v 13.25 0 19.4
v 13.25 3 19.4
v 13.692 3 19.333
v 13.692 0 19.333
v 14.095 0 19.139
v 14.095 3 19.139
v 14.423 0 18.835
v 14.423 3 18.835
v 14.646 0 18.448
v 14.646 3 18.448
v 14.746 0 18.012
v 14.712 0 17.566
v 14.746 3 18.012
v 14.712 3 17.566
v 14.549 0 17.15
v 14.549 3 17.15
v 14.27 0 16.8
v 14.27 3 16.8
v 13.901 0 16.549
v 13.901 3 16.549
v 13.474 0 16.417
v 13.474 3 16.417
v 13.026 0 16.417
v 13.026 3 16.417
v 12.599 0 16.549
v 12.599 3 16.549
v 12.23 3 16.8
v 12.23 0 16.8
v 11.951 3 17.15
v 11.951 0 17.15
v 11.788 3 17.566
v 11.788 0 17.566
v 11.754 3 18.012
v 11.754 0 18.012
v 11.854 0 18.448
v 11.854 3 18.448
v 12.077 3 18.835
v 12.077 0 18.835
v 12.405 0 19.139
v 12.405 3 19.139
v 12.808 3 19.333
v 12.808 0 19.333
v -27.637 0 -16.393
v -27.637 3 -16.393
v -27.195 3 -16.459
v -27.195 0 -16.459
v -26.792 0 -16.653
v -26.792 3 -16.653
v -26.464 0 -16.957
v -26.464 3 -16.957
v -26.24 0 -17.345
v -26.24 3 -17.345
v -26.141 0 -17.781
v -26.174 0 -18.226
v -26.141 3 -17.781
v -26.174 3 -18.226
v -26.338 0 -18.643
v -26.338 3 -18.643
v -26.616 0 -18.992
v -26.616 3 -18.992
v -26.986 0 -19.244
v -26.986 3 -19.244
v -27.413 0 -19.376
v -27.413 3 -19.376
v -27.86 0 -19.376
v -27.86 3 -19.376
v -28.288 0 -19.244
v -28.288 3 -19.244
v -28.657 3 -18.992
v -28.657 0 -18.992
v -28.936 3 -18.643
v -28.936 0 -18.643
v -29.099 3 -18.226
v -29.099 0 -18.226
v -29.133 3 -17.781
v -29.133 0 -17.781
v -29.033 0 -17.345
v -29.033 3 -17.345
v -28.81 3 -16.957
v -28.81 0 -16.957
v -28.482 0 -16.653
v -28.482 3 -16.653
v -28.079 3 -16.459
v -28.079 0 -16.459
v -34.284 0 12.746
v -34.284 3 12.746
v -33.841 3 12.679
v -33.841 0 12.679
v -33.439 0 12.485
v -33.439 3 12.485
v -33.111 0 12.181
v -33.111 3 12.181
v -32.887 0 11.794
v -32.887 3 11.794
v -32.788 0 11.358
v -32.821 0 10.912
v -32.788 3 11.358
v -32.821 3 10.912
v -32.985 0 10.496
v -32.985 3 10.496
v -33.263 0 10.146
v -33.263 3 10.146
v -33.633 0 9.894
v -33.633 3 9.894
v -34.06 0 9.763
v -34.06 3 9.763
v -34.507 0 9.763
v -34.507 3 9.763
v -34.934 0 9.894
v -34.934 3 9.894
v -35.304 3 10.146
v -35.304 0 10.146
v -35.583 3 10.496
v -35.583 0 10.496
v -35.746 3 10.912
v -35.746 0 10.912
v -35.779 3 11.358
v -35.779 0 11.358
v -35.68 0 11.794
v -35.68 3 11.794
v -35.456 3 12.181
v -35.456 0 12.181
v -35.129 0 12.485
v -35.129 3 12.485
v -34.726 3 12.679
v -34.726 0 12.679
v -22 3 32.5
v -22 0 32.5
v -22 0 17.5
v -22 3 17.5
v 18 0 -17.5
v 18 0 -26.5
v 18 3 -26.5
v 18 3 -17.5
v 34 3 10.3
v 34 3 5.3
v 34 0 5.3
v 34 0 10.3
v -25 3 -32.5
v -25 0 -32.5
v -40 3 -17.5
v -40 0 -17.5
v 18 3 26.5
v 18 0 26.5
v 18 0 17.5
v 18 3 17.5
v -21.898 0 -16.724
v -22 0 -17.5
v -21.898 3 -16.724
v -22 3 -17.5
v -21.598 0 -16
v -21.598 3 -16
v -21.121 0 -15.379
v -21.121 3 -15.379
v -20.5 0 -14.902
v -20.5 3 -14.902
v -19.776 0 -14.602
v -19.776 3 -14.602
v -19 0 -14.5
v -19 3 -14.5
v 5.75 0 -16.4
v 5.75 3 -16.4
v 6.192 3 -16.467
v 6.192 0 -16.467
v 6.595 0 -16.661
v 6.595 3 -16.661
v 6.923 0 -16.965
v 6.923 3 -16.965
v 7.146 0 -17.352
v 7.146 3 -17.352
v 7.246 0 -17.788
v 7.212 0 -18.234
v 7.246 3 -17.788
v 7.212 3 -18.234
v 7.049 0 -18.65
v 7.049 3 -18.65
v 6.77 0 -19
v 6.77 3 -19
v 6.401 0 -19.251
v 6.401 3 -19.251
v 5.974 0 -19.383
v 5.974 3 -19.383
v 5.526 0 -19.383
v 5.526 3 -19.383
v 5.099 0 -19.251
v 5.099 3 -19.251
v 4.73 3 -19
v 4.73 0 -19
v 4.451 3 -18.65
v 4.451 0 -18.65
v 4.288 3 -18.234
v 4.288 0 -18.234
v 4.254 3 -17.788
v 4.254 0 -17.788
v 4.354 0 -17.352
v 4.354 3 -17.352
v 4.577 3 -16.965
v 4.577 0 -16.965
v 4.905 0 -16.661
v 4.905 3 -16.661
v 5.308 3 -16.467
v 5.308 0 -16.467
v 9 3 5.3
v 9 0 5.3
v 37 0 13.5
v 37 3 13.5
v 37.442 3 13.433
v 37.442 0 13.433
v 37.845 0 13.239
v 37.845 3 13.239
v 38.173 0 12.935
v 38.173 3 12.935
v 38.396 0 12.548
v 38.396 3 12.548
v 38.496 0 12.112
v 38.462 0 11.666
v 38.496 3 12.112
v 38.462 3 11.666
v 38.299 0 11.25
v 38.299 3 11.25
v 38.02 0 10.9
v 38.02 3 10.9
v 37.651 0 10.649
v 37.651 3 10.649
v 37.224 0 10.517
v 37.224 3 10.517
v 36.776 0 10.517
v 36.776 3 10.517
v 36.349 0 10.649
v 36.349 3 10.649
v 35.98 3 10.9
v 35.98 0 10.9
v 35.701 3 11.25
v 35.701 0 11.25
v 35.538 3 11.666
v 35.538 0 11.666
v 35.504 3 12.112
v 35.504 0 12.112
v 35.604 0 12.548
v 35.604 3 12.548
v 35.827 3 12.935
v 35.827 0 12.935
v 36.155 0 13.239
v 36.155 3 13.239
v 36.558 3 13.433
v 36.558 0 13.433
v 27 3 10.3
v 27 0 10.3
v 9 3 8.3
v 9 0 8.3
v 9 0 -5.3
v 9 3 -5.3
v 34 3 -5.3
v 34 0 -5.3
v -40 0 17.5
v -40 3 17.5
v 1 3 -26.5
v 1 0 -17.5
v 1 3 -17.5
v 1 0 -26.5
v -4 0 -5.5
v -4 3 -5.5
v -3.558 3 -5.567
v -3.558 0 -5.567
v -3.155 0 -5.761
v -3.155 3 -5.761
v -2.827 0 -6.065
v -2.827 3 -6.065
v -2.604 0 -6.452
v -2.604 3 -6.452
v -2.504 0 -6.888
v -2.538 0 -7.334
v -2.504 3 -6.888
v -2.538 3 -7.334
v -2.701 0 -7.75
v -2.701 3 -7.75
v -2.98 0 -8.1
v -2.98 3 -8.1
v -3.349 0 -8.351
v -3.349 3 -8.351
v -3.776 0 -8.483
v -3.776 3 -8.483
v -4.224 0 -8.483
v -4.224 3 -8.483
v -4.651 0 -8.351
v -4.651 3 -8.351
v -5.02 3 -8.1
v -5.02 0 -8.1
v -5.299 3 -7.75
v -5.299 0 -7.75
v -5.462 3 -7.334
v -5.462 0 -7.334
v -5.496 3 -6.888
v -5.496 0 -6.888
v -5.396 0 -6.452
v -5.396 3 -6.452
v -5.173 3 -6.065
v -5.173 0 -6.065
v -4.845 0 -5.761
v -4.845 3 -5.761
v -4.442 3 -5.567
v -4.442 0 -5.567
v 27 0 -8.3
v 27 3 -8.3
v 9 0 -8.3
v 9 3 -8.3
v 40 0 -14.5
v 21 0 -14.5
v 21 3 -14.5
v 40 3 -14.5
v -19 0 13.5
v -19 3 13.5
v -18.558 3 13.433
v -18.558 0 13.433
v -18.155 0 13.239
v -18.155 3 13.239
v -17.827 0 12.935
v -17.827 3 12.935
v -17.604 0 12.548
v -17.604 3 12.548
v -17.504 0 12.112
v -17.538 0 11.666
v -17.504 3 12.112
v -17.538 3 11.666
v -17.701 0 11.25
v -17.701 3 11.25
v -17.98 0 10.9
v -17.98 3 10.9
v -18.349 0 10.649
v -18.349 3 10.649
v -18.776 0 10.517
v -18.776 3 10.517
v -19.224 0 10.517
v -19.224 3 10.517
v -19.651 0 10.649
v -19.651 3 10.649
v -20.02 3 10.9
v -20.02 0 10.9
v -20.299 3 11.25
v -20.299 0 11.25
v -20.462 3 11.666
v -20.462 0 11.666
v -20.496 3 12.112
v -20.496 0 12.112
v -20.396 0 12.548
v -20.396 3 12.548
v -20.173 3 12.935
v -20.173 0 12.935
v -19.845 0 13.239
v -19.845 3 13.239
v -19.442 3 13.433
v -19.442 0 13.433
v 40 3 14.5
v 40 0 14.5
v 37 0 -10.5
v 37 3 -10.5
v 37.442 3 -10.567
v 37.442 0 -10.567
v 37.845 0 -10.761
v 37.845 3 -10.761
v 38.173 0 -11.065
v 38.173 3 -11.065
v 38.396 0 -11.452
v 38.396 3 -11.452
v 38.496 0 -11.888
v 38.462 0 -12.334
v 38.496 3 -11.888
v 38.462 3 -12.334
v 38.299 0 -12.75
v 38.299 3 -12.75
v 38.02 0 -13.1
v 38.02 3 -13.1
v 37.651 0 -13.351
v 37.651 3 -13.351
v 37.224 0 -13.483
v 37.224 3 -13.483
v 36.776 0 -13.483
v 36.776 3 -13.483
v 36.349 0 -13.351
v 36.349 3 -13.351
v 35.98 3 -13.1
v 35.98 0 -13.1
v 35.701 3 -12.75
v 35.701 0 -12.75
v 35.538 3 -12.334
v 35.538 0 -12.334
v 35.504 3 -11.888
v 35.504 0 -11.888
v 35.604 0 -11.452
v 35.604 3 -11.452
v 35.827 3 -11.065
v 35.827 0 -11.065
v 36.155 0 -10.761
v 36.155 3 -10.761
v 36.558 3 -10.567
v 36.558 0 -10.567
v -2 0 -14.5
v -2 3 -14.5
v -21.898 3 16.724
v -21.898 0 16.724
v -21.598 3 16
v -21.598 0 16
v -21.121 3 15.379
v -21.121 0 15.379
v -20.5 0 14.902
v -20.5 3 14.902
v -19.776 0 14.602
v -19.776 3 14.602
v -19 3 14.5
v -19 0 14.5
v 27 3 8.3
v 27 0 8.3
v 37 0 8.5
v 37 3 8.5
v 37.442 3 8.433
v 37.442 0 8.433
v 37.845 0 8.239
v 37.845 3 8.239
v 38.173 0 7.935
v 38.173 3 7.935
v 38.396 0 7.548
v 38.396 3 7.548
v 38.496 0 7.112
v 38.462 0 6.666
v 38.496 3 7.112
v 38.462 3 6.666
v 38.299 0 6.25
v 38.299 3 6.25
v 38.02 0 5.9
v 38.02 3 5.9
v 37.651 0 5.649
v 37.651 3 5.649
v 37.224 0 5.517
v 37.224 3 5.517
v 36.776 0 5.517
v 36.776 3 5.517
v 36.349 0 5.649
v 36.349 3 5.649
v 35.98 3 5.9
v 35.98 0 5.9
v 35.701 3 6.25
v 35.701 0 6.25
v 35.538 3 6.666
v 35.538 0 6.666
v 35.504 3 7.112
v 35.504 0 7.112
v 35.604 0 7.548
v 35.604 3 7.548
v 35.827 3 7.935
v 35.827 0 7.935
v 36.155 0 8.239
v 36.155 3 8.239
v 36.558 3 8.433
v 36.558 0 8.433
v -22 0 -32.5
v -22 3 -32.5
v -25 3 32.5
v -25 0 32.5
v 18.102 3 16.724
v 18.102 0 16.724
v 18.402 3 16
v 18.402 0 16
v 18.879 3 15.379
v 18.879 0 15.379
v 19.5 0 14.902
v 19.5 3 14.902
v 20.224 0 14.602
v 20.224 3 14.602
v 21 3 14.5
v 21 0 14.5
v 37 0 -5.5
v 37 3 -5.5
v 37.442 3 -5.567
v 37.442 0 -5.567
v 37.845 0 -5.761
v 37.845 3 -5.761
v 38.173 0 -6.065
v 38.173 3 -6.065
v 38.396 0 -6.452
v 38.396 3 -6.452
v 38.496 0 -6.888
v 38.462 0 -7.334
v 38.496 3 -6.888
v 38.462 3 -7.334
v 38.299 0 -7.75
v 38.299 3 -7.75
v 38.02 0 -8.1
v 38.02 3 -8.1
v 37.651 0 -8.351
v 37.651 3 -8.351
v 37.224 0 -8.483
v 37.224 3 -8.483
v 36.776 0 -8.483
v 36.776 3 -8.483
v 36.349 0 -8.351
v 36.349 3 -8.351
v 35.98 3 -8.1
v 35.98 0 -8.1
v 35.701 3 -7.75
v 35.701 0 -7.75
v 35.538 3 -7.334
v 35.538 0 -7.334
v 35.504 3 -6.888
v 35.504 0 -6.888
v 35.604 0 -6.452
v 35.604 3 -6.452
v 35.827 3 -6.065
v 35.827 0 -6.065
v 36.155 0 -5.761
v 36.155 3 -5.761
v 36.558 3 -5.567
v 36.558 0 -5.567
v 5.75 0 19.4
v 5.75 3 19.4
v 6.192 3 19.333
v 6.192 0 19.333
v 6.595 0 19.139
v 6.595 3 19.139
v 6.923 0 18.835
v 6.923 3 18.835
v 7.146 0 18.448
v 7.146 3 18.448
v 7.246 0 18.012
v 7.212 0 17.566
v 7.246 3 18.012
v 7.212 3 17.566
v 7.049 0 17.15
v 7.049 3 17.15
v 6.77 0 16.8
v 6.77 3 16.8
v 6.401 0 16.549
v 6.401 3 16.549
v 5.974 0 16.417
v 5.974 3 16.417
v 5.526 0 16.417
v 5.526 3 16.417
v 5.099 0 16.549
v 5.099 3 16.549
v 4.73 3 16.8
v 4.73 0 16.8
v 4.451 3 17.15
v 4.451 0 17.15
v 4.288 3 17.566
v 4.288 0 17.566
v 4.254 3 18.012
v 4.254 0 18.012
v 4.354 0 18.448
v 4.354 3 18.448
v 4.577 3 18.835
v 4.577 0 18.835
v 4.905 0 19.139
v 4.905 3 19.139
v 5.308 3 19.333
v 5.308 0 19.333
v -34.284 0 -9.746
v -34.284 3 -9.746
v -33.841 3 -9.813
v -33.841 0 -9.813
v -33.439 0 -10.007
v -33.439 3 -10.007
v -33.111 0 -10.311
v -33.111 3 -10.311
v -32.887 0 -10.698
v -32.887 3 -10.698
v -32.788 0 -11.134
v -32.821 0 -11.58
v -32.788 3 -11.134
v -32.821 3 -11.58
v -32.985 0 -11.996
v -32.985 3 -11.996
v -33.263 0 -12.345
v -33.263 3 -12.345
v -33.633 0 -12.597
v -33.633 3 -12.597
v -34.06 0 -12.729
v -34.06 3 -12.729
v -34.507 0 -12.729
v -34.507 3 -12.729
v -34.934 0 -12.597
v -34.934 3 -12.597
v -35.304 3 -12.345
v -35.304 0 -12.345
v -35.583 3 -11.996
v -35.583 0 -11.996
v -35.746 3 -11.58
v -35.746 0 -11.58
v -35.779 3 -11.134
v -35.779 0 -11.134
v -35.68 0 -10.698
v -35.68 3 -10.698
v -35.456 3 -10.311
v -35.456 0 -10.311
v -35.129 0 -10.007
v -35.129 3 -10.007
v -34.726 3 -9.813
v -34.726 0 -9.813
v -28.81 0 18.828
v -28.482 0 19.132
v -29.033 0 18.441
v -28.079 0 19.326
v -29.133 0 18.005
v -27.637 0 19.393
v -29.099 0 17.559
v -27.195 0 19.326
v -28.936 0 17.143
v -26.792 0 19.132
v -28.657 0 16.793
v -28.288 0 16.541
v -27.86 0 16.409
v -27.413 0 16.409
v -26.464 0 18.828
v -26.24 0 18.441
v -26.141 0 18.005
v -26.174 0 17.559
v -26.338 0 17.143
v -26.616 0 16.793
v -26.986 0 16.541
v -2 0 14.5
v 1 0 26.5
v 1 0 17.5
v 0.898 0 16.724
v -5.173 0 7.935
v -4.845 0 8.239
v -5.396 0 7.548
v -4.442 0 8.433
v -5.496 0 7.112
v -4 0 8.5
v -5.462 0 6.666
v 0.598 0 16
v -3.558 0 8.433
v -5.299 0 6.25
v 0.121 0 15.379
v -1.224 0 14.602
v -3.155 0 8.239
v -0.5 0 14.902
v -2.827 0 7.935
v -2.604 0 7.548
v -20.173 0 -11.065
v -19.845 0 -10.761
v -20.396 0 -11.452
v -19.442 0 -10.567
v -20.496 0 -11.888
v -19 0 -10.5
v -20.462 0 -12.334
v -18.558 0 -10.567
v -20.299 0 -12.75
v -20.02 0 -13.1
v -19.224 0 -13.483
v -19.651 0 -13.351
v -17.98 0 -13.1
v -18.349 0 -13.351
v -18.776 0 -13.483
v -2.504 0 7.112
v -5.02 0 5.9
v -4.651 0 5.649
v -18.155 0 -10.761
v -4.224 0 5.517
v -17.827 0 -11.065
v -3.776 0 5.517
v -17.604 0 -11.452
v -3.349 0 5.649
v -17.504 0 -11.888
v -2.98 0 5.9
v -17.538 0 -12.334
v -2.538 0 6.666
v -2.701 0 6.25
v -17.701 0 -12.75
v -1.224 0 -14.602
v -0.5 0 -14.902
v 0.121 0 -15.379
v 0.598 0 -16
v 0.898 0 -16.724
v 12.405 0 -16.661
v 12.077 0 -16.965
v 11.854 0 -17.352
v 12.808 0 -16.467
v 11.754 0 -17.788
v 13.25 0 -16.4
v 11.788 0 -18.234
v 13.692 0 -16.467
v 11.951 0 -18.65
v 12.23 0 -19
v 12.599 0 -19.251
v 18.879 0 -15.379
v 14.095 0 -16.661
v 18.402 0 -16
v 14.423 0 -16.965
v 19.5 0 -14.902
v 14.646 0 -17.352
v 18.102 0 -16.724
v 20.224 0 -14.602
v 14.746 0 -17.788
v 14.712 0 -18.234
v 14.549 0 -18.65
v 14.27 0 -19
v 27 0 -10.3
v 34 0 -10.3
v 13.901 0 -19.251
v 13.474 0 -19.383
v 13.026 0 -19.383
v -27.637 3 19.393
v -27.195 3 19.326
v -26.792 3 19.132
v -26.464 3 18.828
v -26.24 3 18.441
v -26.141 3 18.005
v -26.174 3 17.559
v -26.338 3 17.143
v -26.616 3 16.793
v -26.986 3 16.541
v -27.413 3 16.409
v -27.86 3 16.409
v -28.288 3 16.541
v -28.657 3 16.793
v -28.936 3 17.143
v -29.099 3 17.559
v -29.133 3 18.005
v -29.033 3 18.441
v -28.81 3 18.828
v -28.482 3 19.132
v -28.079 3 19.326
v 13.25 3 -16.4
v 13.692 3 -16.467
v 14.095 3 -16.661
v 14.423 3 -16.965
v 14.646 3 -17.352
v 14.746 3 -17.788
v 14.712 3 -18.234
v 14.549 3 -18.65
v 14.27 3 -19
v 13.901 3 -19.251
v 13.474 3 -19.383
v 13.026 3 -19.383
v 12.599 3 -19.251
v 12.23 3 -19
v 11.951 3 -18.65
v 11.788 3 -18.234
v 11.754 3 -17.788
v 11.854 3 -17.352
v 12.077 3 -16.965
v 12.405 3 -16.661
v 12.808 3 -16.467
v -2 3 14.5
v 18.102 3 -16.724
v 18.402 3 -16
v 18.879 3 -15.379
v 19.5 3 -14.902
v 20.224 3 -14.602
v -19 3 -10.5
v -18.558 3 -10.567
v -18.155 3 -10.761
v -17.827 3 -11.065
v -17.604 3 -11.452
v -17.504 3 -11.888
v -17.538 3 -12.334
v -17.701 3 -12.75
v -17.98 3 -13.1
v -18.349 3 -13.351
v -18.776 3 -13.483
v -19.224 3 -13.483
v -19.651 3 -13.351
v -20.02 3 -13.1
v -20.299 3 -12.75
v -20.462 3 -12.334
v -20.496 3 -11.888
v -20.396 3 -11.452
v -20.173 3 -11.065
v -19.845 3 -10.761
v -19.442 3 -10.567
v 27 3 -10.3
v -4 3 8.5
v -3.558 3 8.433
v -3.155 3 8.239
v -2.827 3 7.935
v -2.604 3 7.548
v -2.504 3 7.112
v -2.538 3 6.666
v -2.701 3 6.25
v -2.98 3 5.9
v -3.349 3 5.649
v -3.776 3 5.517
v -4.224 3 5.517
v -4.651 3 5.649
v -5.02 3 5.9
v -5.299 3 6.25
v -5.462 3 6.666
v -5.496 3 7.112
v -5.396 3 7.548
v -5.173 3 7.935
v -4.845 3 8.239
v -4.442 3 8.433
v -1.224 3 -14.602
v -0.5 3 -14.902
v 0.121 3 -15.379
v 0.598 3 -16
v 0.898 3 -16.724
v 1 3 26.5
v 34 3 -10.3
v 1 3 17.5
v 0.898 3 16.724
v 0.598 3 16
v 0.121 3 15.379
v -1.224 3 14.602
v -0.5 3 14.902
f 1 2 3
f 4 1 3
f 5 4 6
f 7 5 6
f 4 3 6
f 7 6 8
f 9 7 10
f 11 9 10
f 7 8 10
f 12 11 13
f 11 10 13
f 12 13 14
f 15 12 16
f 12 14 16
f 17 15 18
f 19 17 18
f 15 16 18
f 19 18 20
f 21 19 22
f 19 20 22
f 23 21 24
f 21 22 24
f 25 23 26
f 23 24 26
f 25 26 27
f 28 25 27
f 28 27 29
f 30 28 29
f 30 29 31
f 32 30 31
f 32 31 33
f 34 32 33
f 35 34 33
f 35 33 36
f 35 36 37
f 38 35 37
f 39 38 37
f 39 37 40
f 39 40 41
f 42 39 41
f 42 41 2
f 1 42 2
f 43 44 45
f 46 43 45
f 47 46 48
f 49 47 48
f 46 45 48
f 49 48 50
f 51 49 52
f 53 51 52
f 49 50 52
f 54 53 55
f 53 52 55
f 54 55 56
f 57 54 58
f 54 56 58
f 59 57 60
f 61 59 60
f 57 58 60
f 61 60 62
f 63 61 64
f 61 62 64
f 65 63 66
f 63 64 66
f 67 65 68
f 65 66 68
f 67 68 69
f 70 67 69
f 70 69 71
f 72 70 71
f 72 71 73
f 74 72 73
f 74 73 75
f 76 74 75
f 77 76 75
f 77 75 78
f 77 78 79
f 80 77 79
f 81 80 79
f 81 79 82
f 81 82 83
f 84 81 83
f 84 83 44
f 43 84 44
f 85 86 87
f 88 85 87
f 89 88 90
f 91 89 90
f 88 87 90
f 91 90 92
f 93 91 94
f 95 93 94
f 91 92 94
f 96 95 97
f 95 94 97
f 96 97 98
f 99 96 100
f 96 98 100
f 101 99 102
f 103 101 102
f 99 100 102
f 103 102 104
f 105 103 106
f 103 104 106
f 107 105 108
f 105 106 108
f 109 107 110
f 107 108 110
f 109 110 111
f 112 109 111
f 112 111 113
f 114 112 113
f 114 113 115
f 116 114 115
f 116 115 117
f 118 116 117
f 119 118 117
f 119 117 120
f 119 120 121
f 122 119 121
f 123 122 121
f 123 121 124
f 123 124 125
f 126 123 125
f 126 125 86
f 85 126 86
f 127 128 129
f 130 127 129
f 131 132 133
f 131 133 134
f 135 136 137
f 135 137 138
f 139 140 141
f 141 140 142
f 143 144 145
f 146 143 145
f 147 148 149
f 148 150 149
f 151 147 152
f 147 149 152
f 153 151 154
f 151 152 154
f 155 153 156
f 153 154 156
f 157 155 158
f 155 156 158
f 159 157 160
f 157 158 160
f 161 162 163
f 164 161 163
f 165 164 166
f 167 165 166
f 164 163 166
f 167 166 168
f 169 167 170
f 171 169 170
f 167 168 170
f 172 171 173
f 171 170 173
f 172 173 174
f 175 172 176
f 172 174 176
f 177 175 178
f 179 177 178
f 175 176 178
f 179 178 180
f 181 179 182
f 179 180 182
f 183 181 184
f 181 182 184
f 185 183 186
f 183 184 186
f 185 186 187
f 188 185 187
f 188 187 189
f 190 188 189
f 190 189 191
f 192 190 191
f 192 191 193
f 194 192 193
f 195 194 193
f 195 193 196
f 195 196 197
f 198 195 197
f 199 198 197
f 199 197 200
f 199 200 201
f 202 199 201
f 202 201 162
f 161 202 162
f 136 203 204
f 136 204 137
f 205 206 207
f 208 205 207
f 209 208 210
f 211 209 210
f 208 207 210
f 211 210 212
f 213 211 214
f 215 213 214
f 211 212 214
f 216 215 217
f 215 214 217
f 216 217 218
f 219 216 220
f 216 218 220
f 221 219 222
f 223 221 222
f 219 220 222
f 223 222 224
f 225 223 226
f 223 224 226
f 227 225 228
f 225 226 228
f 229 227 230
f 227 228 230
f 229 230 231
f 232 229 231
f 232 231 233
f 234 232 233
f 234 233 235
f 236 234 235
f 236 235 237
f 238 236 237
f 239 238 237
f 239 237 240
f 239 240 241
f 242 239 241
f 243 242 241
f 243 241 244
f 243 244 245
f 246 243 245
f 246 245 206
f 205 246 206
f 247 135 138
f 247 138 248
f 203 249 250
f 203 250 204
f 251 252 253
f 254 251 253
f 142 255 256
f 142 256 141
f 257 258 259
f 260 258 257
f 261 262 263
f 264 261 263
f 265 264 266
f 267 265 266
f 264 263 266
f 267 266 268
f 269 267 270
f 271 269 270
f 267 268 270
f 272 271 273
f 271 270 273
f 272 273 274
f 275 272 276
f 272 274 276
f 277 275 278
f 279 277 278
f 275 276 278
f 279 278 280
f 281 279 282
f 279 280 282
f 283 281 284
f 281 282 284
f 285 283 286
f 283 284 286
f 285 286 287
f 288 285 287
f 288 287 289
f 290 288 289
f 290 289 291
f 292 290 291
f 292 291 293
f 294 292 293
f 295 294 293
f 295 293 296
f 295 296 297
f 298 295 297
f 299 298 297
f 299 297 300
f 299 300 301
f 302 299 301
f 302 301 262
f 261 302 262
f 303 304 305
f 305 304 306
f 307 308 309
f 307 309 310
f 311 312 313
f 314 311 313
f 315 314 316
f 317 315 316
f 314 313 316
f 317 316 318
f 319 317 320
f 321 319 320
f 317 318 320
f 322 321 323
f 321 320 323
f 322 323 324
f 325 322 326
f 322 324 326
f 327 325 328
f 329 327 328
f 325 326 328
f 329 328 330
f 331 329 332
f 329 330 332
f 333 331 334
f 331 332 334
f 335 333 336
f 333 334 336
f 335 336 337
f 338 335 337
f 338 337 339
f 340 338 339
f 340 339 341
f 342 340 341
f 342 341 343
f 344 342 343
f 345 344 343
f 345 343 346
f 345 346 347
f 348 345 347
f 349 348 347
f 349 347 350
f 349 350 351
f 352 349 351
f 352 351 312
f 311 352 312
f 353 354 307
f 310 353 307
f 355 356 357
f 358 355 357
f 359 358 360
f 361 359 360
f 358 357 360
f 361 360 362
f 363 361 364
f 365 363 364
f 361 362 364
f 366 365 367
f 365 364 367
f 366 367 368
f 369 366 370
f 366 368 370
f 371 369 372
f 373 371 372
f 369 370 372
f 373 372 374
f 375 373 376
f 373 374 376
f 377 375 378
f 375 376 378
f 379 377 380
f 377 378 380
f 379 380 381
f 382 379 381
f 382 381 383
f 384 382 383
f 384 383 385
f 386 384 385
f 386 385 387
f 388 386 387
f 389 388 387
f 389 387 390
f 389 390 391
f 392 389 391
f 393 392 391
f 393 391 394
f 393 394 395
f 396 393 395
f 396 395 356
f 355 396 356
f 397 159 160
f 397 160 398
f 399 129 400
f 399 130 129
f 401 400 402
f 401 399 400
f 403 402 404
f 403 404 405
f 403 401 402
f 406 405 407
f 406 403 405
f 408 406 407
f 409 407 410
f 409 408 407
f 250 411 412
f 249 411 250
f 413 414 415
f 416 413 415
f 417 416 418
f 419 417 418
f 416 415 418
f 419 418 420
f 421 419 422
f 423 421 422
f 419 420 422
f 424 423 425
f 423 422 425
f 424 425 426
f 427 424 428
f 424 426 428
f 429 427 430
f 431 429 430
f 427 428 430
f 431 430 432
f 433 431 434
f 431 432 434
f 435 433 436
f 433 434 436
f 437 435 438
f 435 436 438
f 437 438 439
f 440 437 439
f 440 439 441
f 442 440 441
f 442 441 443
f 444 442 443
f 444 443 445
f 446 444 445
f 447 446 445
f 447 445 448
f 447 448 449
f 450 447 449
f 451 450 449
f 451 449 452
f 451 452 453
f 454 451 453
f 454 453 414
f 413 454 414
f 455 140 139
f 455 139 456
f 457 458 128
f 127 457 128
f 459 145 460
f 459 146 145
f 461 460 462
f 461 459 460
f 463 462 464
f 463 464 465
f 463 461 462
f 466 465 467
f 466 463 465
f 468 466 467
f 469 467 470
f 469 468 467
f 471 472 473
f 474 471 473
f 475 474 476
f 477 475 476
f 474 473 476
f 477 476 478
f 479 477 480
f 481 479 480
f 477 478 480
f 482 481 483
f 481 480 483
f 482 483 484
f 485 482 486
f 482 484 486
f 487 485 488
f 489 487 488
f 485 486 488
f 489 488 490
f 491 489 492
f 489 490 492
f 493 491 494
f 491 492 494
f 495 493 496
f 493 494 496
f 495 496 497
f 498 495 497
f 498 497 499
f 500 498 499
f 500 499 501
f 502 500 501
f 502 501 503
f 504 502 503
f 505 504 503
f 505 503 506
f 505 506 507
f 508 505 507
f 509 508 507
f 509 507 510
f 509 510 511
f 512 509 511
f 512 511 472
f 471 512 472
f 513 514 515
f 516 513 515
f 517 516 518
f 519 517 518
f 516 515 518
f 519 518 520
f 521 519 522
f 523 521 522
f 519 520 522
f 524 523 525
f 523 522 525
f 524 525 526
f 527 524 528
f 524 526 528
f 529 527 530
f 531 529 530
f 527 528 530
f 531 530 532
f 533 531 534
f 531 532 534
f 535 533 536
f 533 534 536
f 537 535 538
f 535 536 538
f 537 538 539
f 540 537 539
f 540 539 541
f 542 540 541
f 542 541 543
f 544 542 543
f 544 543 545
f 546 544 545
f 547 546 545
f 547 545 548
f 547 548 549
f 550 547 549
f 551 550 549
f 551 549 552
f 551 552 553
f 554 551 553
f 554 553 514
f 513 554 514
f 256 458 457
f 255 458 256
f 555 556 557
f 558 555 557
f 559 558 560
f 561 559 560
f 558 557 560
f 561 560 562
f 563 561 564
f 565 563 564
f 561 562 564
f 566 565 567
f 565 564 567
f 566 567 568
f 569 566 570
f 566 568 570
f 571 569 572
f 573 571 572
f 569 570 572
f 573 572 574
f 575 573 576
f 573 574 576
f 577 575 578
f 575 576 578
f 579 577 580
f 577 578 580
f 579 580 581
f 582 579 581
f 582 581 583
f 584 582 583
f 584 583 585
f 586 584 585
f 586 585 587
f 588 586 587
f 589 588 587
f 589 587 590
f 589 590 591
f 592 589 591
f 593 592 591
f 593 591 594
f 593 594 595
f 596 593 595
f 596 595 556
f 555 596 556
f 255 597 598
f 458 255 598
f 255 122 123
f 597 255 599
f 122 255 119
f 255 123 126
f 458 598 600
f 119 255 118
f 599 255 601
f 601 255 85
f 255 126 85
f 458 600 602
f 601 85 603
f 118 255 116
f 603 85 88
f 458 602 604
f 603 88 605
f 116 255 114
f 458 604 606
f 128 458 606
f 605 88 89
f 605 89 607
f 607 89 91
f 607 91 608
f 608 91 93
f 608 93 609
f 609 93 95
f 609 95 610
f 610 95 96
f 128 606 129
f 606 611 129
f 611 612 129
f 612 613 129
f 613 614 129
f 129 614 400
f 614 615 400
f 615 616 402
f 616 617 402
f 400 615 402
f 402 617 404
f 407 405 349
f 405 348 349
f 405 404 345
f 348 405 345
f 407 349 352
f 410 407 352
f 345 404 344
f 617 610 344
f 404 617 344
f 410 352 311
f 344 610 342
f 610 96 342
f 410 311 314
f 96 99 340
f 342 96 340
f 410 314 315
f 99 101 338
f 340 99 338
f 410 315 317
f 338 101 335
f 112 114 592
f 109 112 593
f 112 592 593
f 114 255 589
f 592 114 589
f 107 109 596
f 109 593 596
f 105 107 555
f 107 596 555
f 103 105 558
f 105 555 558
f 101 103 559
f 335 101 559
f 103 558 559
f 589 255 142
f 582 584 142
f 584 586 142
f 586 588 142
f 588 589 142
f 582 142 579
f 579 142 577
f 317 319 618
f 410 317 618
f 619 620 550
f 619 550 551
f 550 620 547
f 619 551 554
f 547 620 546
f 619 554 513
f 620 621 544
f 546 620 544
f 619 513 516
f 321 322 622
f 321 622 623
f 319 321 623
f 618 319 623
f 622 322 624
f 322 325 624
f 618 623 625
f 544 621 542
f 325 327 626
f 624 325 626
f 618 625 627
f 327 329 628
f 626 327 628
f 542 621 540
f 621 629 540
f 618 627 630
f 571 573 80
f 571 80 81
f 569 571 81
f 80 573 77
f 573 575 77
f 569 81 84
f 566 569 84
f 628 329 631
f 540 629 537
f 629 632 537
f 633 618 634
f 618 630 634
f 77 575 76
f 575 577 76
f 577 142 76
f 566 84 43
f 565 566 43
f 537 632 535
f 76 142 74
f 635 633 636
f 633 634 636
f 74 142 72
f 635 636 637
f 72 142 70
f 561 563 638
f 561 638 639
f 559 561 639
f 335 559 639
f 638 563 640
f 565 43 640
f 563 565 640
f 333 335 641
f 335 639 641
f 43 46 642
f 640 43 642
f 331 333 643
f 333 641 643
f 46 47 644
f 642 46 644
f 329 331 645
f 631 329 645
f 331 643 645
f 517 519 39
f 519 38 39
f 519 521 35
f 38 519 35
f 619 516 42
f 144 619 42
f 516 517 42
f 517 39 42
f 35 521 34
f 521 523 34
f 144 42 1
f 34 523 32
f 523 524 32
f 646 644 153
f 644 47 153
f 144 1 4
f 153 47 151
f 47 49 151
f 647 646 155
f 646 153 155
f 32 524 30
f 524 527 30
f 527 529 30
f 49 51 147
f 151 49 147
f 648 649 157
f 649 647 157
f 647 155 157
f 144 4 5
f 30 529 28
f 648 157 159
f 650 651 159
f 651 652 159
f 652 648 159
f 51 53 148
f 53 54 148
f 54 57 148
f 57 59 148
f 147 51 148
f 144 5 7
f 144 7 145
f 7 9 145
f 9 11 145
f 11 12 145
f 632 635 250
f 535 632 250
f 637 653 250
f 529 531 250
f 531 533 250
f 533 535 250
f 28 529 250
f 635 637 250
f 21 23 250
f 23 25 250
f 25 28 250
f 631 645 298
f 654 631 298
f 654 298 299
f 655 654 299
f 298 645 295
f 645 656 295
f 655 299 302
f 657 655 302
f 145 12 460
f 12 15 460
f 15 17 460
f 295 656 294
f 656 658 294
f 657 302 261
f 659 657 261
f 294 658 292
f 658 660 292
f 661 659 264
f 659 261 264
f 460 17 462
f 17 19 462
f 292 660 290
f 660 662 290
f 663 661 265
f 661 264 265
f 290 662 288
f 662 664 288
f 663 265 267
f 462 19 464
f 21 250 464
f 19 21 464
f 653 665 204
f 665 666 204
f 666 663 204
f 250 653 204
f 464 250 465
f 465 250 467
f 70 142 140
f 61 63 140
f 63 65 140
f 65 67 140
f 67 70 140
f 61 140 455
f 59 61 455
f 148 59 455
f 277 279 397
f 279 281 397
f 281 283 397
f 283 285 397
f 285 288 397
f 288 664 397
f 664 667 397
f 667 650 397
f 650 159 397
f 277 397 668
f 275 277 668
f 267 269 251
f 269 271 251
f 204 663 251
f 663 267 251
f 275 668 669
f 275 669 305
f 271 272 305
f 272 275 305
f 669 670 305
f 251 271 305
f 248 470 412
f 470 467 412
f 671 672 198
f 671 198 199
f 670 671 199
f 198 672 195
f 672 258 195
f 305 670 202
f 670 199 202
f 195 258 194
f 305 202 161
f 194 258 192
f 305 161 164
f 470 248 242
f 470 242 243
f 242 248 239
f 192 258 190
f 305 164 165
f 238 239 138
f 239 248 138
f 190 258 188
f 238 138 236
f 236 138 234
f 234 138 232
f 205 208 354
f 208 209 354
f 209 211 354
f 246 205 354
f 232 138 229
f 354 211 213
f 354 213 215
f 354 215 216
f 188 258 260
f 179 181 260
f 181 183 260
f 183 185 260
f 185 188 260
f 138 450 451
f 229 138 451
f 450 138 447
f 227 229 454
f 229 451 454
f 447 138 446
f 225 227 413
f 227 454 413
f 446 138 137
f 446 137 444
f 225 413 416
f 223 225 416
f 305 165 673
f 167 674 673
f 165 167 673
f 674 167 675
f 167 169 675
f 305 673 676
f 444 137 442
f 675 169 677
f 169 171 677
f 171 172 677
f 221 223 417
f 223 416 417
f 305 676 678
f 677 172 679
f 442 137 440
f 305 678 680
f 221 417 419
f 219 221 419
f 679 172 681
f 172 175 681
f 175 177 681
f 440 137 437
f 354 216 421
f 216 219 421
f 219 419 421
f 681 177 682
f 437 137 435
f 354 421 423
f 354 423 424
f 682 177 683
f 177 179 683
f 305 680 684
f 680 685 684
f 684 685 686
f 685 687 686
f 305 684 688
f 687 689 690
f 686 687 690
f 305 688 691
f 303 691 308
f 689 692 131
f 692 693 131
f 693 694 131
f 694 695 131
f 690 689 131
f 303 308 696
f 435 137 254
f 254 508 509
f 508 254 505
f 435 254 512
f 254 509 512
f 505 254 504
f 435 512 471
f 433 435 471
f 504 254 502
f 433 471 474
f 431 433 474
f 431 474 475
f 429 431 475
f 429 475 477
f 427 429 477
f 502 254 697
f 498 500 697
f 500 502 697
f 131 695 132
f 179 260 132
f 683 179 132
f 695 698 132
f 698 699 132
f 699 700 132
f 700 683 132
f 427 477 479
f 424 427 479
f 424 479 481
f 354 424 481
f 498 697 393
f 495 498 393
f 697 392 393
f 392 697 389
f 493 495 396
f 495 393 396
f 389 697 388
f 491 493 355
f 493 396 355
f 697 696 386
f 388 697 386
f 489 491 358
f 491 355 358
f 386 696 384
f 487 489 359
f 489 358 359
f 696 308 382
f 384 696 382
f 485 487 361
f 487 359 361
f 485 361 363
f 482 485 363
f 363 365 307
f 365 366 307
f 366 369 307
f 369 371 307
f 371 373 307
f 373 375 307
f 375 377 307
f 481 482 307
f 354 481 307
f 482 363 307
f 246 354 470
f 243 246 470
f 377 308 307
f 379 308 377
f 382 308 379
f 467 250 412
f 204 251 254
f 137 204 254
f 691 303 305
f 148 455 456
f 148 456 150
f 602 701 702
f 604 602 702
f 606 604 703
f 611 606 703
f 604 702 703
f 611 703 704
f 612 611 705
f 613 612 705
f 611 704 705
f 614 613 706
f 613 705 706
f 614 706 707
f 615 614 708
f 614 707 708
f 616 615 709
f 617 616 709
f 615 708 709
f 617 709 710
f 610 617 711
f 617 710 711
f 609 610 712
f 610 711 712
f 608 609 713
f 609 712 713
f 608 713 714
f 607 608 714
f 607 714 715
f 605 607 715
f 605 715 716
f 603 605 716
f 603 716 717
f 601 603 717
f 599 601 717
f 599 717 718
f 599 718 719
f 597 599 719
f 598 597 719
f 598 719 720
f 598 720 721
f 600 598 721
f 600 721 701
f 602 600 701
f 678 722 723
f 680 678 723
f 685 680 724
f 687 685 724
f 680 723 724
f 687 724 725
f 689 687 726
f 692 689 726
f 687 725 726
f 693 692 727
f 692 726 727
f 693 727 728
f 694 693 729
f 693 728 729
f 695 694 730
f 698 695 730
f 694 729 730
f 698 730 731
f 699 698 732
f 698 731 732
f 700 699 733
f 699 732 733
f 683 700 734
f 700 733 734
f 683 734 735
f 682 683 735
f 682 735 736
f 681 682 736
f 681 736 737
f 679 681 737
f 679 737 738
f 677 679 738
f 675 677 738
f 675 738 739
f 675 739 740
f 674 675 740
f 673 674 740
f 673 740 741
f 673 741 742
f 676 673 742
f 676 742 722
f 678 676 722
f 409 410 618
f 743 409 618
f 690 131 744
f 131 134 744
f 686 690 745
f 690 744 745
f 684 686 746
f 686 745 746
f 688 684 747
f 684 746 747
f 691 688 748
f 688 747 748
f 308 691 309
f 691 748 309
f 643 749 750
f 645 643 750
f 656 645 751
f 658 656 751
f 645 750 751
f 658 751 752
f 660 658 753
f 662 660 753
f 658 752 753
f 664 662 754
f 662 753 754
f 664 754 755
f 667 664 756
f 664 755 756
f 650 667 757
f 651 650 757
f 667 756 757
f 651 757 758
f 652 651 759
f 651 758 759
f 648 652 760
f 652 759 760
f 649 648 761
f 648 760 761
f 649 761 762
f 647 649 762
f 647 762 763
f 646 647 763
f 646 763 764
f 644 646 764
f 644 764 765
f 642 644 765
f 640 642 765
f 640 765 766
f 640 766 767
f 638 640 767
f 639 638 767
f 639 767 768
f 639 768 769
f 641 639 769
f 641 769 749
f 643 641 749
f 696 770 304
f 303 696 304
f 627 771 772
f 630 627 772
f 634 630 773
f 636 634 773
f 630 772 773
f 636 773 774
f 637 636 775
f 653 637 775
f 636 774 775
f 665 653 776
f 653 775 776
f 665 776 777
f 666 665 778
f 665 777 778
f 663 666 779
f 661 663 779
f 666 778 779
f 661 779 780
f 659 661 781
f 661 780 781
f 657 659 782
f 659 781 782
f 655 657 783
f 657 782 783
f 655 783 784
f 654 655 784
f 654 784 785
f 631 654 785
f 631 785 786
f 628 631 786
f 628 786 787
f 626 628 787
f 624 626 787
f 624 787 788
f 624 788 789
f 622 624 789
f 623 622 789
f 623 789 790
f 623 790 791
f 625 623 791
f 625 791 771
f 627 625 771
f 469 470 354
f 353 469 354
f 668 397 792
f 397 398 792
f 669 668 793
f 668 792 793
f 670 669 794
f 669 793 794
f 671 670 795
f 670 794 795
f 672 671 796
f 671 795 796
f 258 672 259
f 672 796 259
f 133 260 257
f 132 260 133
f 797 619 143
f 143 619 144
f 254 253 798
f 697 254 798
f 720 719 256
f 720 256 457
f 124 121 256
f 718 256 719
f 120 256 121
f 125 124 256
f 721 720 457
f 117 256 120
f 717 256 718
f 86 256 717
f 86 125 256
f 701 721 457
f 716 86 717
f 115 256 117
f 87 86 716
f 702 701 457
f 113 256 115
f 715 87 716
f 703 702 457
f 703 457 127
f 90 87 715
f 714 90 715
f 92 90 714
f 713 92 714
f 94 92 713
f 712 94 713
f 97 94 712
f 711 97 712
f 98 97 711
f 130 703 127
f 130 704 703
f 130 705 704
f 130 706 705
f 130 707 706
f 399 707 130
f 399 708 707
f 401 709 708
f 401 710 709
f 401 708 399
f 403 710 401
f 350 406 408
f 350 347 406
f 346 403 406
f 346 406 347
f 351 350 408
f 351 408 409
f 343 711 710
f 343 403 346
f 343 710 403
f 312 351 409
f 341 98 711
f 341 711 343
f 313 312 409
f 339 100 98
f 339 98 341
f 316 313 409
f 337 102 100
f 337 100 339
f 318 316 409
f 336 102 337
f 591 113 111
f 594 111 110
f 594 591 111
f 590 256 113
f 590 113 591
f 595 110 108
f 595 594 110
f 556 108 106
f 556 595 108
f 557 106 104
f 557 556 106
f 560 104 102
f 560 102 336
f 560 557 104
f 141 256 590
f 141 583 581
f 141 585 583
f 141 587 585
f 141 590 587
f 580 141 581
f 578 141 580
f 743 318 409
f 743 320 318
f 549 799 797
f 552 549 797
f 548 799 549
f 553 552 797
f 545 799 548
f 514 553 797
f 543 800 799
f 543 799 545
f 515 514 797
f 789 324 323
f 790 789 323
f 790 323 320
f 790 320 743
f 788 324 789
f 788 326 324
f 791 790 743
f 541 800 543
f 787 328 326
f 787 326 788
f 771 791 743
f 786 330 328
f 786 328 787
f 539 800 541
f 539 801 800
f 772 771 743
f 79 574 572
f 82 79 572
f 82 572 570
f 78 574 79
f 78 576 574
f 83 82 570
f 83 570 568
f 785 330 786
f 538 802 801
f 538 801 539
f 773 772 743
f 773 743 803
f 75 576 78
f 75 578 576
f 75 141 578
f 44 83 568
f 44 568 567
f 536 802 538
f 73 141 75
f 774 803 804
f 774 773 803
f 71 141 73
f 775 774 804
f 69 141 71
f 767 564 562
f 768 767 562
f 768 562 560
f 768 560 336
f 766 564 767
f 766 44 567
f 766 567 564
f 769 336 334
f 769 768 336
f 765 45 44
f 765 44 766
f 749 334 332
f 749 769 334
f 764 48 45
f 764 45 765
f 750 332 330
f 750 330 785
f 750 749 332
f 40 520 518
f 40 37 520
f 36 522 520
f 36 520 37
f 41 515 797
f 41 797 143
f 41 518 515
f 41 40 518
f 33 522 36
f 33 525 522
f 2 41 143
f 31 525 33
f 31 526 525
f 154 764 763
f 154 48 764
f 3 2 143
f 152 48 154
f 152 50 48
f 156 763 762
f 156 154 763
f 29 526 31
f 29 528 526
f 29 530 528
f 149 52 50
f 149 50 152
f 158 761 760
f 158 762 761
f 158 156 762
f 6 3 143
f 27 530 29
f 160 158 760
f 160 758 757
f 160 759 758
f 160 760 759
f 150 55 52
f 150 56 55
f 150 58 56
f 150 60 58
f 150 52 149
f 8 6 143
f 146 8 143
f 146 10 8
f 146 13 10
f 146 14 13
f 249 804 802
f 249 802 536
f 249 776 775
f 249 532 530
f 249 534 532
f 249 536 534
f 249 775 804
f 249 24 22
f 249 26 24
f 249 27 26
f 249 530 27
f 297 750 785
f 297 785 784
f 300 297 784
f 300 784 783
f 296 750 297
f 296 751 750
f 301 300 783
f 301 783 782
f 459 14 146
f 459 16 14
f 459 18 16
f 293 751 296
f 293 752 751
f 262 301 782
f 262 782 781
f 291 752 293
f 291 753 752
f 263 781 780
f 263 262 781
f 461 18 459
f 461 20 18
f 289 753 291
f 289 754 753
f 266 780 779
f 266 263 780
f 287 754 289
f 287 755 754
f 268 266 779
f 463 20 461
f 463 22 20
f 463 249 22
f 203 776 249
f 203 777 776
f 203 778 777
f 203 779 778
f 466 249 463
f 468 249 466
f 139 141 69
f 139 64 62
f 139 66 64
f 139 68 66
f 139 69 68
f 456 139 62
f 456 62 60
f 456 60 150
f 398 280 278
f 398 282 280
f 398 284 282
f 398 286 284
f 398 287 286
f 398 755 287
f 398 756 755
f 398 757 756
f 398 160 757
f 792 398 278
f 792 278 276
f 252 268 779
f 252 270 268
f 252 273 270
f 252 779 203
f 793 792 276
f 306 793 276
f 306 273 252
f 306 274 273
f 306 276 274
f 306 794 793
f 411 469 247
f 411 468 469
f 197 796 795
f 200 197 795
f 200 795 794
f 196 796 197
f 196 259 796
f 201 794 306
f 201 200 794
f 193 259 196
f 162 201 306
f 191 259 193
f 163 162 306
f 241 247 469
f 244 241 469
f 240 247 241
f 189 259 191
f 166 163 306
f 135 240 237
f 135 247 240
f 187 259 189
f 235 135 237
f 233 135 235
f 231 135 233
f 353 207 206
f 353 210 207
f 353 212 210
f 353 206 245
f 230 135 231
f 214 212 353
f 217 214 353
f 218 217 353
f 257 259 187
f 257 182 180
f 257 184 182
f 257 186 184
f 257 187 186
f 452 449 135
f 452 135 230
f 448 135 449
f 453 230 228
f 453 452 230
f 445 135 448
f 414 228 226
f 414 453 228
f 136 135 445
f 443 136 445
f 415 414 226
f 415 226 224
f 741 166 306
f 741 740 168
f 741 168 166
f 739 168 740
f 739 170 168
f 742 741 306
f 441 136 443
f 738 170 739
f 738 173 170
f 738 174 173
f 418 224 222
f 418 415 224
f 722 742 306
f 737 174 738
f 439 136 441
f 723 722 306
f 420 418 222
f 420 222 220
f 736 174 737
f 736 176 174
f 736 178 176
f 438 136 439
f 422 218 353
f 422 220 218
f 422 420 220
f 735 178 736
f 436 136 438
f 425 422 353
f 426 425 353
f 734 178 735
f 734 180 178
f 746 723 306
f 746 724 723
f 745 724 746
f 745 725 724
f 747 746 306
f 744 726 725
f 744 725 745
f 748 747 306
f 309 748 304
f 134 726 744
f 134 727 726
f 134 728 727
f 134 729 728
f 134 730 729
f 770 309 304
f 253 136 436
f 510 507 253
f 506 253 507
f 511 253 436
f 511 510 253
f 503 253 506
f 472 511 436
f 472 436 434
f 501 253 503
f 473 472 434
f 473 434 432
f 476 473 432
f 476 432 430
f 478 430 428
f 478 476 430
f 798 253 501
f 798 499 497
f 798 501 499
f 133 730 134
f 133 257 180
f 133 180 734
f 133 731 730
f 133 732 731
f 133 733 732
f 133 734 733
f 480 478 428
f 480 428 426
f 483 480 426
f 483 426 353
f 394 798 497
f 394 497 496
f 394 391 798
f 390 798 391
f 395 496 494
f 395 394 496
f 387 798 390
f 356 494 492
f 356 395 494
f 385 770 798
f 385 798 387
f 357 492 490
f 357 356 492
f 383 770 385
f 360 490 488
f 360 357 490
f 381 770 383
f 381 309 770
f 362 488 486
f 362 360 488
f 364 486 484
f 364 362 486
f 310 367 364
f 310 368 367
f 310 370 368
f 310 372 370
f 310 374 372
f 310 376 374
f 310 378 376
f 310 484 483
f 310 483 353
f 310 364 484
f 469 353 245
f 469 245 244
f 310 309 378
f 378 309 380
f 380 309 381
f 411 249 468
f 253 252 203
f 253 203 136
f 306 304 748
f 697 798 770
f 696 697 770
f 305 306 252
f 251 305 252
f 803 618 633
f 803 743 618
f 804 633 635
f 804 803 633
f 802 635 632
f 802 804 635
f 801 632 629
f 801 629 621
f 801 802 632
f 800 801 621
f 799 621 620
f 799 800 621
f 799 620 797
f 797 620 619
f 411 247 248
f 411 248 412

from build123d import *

# Parameters (mm, degrees)
SKETCH1_W           = 80
SKETCH1_H           = 65
BOSS_EXTRUDE1_DEPTH = 3
CUT_EXTRUDE1_DEPTH  = 10
CUT_EXTRUDE2_DEPTH  = 10
SKETCH4_R           = 1.5
CUT_EXTRUDE3_DEPTH  = 10
FILLET1_R           = 3
CUT_EXTRUDE4_DEPTH  = 10


with BuildPart() as part:
    # Sketch1 → Boss-Extrude1 (new body)
    with BuildSketch(Plane(origin=(0, 0, 0), x_dir=(1, 0, 0), z_dir=(0, 1, 0))):
        Rectangle(SKETCH1_W, SKETCH1_H)
    extrude(amount=BOSS_EXTRUDE1_DEPTH)

    # Sketch2 → Cut-Extrude1 (cut)
    with BuildSketch(Plane(origin=(0, 0, 0), x_dir=(-1, 0, 0), z_dir=(0, -1, 0))):
        Polygon((22, 32.5), (22, 14.5), (-1, 14.5), (-1, 26.5), (-18, 26.5), (-18, 14.5), (-40, 14.5), (-40, 32.5), align=None)
        Polygon((-1, -26.5), (-18, -26.5), (-18, -14.5), (-40, -14.5), (-40, -32.5), (22, -32.5), (22, -14.5), (-1, -14.5), align=None)
    extrude(amount=-CUT_EXTRUDE1_DEPTH, mode=Mode.SUBTRACT)

    # Sketch3 → Cut-Extrude2 (cut)
    with BuildSketch(Plane(origin=(0, 3, 0), x_dir=(1, 0, 0), z_dir=(0, 1, 0))):
        Polygon((27, -8.3), (9, -8.3), (9, -5.3), (34, -5.3), (34, -10.3), (27, -10.3), align=None)
        Polygon((34, 5.3), (34, 10.3), (27, 10.3), (27, 8.3), (9, 8.3), (9, 5.3), align=None)
    extrude(amount=-CUT_EXTRUDE2_DEPTH, mode=Mode.SUBTRACT)

    # Sketch4 → Cut-Extrude3 (cut)
    with BuildSketch(Plane(origin=(0, 3, 0), x_dir=(1, 0, 0), z_dir=(0, 1, 0))):
        with Locations(Location((-4, 7, 0), (0, 0, 270))):
            Circle(SKETCH4_R)
        with Locations(Location((13.25, 17.9, 0), (0, 0, 270))):
            Circle(SKETCH4_R)
        with Locations(Location((5.75, 17.9, 0), (0, 0, 270))):
            Circle(SKETCH4_R)
        with Locations(Location((37, 7, 0), (0, 0, 270))):
            Circle(SKETCH4_R)
        with Locations(Location((37, 12, 0), (0, 0, 270))):
            Circle(SKETCH4_R)
        with Locations(Location((-19, 12, 0), (0, 0, 270))):
            Circle(SKETCH4_R)
        with Locations(Location((-27.636753237, 17.892684015, 0), (0, 0, 270))):
            Circle(SKETCH4_R)
        with Locations(Location((-34.28355698, 11.245880272, 0), (0, 0, 270))):
            Circle(SKETCH4_R)
        with Locations(Location((-34.28355698, -11.245880272, 0), (0, 0, 270))):
            Circle(SKETCH4_R)
        with Locations(Location((-27.636753237, -17.892684015, 0), (0, 0, 270))):
            Circle(SKETCH4_R)
        with Locations(Location((-19, -12, 0), (0, 0, 270))):
            Circle(SKETCH4_R)
        with Locations(Location((-4, -7, 0), (0, 0, 270))):
            Circle(SKETCH4_R)
        with Locations(Location((5.75, -17.9, 0), (0, 0, 270))):
            Circle(SKETCH4_R)
        with Locations(Location((13.25, -17.9, 0), (0, 0, 270))):
            Circle(SKETCH4_R)
        with Locations(Location((37, -7, 0), (0, 0, 270))):
            Circle(SKETCH4_R)
        with Locations(Location((37, -12, 0), (0, 0, 270))):
            Circle(SKETCH4_R)
    extrude(amount=-CUT_EXTRUDE3_DEPTH, mode=Mode.SUBTRACT)

    # Fillet1
    fillet1_edges = [part.edges().sort_by_distance(p)[0] for p in [
        (-22, 1.5, -14.5),
        (1, 1.5, -14.5),
        (18, 1.5, -14.5),
        (1, 1.5, 14.5),
        (-22, 1.5, 14.5),
        (18, 1.5, 14.5),
    ]]
    fillet(fillet1_edges, radius=FILLET1_R)

    # Sketch5 → Cut-Extrude4 (cut)
    with BuildSketch(Plane(origin=(0, 0, 0), x_dir=(-1, 0, 0), z_dir=(0, -1, 0))):
        Polygon((40, 32.5), (25, 32.5), (40, 17.5), align=None)
        Polygon((40, -17.5), (40, -32.5), (25, -32.5), align=None)
    extrude(amount=-CUT_EXTRUDE4_DEPTH, mode=Mode.SUBTRACT)


solid = part.part
